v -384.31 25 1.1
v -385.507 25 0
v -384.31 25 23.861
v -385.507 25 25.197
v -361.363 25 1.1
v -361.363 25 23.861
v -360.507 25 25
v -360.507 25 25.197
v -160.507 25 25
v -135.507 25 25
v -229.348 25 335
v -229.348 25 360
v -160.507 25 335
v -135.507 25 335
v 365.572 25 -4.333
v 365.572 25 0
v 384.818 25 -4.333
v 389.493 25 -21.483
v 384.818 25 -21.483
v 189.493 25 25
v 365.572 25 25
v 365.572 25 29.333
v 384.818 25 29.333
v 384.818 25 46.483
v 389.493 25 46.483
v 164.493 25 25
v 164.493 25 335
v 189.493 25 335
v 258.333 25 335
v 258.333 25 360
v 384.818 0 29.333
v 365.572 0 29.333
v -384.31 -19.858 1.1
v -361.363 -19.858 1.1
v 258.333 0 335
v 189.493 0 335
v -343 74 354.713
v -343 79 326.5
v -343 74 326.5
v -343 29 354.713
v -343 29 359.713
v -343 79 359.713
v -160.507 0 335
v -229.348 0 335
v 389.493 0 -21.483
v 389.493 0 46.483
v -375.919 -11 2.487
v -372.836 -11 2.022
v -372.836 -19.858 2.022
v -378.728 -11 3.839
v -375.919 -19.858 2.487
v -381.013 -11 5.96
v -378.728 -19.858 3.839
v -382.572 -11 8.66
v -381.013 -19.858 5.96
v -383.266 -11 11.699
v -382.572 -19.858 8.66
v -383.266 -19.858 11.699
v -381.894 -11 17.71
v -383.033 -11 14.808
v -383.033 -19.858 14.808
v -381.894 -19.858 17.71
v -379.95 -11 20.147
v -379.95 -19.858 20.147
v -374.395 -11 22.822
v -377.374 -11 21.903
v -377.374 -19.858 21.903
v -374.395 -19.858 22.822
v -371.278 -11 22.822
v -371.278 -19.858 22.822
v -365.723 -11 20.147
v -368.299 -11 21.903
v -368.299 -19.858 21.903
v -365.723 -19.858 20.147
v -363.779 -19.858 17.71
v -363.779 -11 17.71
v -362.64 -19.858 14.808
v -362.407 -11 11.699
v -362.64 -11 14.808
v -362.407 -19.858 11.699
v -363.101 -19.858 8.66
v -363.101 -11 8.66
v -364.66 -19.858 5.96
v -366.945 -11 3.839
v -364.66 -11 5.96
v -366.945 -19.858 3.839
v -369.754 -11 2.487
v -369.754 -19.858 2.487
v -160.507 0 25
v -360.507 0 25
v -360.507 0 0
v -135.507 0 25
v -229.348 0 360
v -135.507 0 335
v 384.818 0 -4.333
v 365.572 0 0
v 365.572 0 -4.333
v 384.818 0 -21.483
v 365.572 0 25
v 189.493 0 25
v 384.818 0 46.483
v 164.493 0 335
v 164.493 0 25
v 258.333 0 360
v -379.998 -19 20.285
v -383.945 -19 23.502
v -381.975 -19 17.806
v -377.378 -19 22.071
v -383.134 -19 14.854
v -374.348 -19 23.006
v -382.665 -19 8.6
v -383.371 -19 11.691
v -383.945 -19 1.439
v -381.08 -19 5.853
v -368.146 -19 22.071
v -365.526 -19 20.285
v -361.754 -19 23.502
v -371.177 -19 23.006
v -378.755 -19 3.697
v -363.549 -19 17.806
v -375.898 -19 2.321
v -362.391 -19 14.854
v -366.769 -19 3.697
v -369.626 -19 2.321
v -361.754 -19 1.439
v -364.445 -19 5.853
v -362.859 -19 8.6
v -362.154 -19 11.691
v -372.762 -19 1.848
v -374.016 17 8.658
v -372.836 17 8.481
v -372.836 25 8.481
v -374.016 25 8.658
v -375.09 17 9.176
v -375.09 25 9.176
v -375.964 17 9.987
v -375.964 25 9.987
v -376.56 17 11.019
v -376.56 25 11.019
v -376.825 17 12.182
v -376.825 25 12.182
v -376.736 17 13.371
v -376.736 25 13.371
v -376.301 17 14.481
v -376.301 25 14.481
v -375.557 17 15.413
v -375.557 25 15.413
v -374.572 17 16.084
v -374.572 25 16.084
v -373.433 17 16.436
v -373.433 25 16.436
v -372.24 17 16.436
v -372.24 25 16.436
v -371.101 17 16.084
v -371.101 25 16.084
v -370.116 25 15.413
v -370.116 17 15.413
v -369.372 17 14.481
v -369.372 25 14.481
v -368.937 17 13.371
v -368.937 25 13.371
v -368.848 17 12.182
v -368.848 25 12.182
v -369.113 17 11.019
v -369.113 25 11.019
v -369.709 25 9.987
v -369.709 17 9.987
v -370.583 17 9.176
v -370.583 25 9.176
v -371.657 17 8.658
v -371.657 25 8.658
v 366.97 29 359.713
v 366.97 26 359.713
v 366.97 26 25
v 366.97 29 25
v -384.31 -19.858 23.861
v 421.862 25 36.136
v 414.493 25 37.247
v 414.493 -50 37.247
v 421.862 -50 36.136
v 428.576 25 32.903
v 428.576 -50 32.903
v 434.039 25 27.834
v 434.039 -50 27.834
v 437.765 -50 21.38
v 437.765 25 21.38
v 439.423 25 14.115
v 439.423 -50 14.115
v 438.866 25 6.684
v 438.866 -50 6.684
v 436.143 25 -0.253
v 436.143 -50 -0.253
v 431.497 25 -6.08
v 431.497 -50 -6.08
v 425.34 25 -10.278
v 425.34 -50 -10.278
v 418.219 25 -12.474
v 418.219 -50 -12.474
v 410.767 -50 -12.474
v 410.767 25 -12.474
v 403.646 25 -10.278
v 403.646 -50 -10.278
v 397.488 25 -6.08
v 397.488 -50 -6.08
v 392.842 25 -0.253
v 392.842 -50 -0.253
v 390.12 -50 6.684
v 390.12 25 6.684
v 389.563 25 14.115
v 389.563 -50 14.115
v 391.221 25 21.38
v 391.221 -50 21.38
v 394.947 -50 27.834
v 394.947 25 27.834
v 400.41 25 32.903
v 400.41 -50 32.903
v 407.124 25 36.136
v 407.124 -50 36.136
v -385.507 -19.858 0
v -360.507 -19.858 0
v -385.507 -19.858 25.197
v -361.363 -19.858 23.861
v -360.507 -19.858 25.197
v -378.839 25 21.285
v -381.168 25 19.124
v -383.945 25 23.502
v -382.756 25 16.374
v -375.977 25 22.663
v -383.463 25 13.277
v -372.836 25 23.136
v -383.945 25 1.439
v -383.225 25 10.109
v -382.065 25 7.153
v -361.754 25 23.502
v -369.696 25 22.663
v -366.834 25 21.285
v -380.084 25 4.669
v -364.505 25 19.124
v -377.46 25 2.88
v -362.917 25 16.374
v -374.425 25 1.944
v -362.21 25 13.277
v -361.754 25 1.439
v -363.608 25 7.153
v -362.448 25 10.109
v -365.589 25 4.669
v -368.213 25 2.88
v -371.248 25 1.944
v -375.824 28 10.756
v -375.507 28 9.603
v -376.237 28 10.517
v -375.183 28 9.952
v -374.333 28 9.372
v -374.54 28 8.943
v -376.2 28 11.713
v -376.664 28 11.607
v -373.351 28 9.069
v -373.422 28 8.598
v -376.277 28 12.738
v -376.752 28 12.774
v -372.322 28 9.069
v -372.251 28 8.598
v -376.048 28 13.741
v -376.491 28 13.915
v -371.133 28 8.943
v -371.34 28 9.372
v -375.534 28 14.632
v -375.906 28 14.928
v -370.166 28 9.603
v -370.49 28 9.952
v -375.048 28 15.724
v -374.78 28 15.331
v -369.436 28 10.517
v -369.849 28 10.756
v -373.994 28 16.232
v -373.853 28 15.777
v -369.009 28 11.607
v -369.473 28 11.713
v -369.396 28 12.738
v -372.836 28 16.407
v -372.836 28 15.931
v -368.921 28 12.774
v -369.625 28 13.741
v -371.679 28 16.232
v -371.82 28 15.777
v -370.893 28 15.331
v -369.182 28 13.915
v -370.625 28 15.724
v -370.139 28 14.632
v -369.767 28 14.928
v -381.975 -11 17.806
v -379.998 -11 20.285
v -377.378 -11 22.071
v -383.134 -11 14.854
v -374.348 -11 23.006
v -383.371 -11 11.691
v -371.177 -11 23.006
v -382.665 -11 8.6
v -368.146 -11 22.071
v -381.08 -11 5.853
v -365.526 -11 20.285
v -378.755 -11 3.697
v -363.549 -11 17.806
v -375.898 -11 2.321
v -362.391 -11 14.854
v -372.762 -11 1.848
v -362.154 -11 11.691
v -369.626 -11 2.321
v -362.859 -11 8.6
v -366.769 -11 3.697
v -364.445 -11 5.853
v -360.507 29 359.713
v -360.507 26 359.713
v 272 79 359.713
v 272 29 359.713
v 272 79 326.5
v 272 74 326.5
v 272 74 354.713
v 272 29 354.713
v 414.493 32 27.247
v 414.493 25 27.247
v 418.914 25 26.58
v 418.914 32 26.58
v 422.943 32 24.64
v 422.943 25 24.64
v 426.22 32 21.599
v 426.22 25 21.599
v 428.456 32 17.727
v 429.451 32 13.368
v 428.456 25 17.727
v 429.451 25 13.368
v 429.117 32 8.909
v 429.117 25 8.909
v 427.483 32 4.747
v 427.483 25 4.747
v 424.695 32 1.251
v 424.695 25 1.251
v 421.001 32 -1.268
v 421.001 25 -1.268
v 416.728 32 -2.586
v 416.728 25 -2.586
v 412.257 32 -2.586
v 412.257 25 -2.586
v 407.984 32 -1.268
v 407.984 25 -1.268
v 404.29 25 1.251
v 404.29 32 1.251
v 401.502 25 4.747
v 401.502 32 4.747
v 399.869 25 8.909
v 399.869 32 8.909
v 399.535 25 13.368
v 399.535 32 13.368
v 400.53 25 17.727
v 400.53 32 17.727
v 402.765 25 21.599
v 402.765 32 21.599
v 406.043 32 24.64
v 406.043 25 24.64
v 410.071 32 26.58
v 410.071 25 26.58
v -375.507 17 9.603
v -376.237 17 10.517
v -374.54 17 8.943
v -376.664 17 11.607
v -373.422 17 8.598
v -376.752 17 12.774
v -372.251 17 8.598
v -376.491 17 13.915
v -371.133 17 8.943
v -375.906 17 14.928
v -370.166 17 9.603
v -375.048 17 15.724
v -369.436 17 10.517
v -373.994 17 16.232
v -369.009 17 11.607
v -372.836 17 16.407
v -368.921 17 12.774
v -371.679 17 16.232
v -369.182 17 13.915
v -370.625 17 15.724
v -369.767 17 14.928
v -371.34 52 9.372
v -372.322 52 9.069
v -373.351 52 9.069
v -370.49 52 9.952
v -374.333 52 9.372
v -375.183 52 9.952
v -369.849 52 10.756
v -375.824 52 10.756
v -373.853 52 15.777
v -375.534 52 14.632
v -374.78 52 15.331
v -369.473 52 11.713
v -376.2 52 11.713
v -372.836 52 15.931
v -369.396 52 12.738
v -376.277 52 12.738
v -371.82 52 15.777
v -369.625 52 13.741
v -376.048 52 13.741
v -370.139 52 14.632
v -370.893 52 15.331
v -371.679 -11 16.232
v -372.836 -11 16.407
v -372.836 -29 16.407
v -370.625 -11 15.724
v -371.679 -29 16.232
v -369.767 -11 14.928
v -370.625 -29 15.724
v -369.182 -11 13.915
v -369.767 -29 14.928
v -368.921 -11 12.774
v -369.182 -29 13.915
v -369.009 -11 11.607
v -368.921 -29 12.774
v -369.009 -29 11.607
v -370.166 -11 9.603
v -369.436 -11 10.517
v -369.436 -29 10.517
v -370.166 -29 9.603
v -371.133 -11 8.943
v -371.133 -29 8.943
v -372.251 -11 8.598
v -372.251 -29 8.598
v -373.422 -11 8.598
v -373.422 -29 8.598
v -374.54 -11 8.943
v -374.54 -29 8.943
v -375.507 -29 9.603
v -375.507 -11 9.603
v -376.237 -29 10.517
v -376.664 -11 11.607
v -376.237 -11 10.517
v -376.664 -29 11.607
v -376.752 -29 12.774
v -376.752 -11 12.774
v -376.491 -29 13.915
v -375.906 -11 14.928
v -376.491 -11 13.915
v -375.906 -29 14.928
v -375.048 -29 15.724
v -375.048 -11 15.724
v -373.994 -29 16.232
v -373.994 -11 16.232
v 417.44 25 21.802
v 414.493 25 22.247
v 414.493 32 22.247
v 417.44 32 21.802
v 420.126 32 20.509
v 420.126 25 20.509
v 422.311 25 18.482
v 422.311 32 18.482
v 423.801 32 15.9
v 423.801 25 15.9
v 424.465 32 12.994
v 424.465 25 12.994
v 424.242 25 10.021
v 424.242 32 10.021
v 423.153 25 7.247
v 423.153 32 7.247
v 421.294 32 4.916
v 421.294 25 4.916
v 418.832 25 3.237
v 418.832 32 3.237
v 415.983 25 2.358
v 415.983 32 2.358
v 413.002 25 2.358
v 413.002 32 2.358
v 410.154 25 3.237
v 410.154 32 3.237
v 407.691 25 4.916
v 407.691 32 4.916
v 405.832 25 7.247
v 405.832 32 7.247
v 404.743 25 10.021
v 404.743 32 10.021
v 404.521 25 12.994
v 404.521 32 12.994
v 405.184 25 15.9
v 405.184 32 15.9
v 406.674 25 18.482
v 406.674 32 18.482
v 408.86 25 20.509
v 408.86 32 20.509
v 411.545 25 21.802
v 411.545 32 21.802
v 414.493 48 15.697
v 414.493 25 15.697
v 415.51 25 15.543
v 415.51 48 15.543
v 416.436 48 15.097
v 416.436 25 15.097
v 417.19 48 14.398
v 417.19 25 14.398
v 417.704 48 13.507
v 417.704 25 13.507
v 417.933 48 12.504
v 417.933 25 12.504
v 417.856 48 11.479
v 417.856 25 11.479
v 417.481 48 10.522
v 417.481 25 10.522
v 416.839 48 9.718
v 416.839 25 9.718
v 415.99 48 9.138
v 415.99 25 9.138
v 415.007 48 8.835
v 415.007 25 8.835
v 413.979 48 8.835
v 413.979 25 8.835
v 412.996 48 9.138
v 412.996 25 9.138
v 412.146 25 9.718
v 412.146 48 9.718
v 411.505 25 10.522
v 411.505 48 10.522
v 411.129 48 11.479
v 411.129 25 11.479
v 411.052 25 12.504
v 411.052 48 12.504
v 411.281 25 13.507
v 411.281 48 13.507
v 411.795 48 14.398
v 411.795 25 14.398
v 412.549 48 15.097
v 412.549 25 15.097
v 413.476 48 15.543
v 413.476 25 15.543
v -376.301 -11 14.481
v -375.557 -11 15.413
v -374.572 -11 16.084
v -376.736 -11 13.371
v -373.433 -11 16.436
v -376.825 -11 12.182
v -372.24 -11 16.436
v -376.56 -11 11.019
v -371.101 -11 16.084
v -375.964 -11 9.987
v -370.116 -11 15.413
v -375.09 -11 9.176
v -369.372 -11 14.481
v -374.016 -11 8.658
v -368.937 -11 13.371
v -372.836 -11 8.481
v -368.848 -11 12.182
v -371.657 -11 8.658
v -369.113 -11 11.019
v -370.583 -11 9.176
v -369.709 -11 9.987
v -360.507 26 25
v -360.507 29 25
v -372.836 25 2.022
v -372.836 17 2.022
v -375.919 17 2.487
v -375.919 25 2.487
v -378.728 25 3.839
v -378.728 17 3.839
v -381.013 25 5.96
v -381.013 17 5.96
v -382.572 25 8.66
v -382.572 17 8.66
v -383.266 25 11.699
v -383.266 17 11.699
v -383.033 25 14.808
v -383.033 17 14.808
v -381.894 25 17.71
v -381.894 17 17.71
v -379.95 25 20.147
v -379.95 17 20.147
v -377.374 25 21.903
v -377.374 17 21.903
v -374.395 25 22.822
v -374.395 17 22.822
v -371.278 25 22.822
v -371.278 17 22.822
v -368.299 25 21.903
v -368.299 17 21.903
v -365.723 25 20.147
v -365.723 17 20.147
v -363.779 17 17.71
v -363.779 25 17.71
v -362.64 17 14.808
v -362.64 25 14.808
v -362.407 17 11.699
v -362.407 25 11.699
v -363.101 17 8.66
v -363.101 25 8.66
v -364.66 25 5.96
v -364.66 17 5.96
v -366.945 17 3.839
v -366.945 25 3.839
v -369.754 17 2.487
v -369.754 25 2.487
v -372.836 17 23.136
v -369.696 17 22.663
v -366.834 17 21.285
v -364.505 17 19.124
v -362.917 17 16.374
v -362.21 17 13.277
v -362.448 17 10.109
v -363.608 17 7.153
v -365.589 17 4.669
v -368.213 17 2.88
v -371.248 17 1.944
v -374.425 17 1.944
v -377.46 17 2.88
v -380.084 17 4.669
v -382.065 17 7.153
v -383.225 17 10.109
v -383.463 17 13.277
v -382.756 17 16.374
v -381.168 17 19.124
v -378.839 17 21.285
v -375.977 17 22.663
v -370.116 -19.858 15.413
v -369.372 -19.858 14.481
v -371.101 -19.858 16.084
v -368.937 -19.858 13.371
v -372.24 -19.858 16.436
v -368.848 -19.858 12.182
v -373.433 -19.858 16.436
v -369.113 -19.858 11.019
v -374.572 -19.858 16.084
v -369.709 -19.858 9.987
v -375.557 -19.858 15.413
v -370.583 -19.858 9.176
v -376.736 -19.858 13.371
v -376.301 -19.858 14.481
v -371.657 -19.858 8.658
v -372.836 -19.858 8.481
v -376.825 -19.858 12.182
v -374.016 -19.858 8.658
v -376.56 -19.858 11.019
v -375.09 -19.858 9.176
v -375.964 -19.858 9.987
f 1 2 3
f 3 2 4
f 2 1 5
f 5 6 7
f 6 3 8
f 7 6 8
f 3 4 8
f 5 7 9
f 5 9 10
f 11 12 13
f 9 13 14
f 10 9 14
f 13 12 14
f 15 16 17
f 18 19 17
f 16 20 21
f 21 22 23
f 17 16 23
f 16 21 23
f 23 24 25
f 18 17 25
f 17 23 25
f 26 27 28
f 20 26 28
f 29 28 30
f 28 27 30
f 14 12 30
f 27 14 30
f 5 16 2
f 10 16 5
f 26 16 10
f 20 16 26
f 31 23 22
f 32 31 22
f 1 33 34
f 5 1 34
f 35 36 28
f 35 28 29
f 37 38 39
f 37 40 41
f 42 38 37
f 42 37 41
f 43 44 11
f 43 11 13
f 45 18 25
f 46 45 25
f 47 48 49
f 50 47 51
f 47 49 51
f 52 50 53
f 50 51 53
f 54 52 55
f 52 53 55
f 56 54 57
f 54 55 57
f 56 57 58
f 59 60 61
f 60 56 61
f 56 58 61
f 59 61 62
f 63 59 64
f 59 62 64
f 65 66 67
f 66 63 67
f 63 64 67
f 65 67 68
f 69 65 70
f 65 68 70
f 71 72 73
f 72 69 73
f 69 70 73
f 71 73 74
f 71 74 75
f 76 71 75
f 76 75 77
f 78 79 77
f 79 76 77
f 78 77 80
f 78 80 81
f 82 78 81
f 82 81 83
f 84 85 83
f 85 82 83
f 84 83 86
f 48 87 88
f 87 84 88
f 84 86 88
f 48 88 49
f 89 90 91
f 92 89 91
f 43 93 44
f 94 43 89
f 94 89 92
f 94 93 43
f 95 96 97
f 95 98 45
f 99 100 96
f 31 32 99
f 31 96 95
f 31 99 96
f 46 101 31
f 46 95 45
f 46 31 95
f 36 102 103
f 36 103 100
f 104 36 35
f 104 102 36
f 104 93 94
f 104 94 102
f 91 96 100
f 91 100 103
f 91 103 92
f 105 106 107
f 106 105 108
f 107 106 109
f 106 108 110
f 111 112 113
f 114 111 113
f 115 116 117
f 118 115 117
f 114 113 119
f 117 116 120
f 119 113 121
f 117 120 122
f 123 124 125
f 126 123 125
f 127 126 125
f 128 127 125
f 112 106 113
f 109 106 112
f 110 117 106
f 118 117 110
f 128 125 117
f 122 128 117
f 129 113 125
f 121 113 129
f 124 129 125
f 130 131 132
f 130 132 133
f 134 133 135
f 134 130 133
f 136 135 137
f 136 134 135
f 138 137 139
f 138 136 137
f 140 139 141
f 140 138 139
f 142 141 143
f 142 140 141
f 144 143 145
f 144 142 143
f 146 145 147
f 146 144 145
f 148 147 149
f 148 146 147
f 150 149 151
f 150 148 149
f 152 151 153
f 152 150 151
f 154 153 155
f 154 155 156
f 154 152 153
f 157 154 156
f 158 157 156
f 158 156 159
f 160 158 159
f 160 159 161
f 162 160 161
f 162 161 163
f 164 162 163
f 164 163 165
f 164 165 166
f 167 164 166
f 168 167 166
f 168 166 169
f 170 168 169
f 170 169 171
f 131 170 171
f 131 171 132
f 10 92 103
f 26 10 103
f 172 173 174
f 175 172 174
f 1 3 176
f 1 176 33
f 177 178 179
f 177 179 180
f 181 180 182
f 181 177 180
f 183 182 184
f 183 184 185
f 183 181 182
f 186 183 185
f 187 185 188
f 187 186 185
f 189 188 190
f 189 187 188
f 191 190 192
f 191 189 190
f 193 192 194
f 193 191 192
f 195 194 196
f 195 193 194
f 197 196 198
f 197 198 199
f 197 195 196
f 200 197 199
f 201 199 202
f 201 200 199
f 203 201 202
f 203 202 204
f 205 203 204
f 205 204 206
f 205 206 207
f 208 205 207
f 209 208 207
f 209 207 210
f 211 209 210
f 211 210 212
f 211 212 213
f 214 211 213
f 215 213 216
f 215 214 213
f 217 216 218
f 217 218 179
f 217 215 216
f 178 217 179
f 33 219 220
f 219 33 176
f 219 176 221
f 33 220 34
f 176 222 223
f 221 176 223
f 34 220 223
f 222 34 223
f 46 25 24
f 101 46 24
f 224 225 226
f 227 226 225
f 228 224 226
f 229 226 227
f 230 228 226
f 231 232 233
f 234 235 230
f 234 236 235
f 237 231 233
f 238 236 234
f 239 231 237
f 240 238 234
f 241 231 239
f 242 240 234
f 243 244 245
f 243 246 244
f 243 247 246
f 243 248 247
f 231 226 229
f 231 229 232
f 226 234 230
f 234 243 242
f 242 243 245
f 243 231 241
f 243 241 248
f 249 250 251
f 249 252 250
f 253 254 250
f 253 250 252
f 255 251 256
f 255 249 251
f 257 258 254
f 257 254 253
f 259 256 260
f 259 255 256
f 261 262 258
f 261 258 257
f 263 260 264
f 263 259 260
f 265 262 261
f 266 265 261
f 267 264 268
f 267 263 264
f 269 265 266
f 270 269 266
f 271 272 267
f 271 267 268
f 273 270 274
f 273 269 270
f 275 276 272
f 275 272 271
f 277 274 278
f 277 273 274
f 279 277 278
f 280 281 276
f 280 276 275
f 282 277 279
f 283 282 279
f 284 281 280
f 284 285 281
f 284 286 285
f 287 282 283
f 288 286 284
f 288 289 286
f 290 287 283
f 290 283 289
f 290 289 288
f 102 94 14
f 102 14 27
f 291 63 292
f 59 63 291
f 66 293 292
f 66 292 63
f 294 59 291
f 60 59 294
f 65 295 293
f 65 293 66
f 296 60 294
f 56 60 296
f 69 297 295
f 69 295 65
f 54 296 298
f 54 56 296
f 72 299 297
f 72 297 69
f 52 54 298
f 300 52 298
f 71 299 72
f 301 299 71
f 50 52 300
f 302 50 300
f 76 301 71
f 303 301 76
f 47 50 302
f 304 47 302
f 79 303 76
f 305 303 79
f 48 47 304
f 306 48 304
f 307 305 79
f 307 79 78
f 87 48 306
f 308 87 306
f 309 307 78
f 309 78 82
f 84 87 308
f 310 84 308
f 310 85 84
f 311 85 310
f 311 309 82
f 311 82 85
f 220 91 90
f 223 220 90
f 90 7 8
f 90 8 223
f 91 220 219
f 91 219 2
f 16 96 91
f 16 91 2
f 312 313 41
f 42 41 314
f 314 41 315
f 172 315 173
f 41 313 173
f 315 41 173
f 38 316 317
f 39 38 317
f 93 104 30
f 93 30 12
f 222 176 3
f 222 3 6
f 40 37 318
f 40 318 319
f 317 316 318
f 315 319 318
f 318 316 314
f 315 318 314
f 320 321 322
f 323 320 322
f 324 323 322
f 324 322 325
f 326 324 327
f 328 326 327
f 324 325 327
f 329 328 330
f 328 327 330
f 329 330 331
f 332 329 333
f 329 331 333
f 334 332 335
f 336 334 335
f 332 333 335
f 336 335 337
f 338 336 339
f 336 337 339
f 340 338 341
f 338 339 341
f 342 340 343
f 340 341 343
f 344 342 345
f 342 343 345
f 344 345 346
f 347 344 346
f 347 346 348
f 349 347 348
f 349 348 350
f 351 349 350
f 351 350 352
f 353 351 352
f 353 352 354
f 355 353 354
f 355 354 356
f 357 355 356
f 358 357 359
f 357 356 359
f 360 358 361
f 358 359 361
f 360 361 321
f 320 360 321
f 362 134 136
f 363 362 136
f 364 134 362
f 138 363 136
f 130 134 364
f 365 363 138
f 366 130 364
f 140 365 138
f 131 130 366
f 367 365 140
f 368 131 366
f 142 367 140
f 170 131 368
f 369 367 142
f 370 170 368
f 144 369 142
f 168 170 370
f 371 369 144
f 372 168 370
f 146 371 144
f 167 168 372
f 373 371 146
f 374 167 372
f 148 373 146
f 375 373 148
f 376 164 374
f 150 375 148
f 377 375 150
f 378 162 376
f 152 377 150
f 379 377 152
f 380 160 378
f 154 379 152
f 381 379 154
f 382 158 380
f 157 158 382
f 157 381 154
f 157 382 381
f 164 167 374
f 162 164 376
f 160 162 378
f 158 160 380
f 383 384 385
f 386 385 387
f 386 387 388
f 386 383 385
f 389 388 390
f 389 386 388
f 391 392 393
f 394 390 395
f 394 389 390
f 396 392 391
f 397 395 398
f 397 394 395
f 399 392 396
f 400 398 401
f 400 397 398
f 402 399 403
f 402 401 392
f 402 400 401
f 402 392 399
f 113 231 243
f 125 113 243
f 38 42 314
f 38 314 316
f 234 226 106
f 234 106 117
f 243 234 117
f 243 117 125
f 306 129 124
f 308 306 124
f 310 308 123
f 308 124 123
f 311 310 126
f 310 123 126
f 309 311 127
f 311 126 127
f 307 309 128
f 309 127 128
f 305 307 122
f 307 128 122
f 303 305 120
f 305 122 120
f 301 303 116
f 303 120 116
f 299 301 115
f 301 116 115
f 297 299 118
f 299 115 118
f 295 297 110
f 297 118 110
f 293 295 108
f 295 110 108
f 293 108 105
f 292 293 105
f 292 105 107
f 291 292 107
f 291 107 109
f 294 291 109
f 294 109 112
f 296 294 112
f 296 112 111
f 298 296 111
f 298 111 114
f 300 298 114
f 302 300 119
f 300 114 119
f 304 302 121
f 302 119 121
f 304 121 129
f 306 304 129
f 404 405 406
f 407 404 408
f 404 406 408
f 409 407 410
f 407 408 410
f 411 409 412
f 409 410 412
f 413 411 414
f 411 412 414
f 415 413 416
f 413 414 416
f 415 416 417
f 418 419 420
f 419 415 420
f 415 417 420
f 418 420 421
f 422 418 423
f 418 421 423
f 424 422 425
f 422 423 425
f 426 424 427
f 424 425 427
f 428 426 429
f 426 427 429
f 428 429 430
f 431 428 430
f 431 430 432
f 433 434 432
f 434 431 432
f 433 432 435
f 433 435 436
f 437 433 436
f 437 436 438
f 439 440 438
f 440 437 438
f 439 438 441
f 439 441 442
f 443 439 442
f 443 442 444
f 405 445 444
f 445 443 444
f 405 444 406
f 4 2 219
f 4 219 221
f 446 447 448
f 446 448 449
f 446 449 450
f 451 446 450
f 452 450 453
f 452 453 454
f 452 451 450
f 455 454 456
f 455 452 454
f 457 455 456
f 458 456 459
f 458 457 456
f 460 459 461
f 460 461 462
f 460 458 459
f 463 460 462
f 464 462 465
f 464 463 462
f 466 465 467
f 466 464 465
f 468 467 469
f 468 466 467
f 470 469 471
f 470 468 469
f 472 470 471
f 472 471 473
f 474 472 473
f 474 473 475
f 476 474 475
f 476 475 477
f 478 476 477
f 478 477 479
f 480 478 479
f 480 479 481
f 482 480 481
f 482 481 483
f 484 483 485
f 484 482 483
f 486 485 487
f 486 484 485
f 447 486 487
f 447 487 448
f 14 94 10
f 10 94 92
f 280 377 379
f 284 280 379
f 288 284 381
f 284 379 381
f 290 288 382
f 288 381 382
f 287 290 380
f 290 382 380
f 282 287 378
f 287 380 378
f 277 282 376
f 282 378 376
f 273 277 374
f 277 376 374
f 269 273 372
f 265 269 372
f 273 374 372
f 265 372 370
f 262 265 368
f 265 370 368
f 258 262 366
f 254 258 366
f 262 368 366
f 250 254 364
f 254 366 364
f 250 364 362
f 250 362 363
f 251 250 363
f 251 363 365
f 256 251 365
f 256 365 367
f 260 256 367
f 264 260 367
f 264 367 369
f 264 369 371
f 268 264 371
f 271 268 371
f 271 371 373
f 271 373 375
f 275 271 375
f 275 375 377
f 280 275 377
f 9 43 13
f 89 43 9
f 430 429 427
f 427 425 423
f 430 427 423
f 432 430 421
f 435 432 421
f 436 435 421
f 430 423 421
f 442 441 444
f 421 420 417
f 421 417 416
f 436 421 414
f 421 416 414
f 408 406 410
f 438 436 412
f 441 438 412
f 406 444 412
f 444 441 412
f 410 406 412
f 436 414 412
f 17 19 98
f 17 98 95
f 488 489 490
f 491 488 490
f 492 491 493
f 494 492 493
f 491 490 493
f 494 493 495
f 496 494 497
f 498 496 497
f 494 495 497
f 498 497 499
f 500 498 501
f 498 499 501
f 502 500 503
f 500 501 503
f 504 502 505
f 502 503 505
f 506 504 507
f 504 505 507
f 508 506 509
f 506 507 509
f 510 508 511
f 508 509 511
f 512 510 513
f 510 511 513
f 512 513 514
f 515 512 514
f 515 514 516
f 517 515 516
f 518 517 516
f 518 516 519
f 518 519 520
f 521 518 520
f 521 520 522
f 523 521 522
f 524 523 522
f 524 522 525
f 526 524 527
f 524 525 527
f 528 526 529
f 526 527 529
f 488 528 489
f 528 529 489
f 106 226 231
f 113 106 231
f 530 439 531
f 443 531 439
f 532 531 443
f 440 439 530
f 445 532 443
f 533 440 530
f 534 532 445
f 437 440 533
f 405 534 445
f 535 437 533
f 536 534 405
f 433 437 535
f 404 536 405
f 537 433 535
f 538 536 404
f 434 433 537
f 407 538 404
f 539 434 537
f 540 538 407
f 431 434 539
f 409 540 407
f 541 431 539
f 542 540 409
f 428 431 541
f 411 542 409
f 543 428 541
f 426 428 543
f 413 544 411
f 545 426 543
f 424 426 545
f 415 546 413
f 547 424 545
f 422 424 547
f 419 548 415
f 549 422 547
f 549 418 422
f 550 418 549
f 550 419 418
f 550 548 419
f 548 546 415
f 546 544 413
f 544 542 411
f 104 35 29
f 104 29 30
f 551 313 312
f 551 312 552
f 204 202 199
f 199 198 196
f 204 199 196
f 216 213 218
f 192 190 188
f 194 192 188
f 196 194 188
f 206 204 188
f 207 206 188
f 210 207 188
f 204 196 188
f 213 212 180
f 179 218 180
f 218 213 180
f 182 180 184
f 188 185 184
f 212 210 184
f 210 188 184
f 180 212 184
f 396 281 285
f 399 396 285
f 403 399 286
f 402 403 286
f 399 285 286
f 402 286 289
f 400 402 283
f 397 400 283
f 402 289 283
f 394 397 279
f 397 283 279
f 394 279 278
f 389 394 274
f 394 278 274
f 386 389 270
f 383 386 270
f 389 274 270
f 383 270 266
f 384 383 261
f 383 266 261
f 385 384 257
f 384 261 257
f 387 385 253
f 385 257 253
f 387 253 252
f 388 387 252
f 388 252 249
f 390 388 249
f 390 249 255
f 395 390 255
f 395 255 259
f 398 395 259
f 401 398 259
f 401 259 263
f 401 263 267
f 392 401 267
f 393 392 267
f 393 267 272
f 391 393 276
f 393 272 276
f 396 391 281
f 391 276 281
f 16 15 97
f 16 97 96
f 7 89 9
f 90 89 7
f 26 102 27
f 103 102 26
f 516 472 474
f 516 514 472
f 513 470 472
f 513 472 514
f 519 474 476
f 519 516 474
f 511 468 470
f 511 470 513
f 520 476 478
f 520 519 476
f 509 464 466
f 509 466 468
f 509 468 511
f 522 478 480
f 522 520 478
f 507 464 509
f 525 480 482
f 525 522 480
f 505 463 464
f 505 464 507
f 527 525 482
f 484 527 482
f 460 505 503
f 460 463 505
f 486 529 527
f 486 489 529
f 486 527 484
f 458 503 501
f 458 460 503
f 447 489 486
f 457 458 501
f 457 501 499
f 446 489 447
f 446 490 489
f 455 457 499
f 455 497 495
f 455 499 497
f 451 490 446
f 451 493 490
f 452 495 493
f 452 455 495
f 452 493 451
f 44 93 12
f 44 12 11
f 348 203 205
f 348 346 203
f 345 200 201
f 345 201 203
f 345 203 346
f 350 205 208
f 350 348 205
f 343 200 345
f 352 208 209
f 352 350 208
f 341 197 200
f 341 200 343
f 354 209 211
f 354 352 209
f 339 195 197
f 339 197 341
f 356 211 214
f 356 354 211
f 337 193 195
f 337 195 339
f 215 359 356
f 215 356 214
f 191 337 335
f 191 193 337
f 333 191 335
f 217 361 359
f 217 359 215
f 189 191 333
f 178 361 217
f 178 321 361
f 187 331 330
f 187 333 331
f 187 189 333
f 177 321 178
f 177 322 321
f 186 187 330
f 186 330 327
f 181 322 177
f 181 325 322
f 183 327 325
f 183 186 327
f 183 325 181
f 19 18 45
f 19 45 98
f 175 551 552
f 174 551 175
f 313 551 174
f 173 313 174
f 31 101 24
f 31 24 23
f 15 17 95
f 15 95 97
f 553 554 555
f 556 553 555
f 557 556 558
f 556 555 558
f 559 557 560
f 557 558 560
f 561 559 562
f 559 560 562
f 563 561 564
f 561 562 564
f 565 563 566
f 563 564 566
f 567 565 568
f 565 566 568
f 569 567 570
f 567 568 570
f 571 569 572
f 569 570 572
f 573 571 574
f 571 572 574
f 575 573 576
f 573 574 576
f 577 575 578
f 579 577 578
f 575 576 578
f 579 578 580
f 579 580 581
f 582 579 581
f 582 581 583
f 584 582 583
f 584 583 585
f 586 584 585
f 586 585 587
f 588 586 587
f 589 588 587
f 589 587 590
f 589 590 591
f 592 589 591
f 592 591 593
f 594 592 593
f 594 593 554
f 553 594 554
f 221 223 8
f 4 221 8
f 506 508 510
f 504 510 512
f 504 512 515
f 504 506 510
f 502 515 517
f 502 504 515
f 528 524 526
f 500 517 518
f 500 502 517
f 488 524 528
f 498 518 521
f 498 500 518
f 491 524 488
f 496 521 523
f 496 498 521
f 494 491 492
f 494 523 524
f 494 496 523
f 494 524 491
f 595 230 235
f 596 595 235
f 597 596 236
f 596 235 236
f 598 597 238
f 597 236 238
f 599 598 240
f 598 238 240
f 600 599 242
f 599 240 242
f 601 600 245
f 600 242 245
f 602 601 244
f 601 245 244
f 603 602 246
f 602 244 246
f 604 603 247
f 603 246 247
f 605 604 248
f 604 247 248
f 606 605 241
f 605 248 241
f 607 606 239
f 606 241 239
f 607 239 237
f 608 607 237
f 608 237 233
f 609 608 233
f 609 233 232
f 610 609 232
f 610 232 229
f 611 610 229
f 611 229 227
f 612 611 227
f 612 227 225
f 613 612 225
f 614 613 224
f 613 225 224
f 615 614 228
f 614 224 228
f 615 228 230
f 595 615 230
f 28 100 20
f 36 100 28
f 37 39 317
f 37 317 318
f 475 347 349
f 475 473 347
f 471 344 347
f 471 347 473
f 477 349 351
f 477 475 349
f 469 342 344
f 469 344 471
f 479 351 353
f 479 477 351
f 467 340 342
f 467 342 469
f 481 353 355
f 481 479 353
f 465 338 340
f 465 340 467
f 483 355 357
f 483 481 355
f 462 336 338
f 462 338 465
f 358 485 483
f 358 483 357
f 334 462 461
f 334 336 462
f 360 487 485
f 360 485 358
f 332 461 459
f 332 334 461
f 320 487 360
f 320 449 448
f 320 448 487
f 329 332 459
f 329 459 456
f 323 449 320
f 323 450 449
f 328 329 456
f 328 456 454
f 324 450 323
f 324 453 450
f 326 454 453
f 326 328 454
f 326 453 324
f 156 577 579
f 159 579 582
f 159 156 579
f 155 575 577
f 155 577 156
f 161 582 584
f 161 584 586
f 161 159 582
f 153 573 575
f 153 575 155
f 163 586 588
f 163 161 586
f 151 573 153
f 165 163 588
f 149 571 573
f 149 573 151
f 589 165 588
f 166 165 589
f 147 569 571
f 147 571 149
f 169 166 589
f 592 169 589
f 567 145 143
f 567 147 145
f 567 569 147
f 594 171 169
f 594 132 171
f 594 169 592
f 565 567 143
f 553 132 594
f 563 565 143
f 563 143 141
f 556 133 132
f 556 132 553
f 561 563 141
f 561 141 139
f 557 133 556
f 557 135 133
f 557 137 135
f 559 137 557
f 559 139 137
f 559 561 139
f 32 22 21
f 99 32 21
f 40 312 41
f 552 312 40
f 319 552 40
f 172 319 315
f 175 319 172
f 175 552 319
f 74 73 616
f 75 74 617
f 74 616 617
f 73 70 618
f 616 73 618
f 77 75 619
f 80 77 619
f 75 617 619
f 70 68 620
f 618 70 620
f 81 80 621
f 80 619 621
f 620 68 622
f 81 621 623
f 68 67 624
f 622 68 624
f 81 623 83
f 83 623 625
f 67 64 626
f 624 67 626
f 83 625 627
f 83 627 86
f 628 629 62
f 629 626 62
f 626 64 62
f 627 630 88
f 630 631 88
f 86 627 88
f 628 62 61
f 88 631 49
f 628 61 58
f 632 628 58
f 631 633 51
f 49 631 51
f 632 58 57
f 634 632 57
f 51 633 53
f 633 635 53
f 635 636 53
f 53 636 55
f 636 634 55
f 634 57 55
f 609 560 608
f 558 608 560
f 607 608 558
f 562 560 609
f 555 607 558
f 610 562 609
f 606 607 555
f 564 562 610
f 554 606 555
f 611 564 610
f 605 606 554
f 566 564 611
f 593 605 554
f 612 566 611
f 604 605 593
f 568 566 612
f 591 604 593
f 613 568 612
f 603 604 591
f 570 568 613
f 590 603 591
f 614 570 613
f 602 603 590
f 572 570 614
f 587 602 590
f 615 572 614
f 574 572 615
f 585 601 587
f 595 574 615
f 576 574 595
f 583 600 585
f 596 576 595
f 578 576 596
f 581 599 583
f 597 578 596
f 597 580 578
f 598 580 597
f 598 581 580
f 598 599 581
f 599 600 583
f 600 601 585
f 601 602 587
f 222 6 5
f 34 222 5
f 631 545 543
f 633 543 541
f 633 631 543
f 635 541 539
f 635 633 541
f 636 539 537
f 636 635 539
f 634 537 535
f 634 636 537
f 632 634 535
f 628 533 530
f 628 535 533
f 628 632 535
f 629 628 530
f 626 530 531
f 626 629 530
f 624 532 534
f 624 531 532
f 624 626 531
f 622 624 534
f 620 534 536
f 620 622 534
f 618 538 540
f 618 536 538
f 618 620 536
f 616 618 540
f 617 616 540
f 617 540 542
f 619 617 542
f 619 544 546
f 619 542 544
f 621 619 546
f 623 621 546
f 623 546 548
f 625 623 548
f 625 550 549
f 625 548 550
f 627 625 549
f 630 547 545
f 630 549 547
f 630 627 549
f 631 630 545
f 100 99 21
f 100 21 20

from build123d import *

# Parameters (mm, degrees)
SKETCH1_W                = 300
SKETCH1_H                = 310
BOSS_EXTRUDE1_DEPTH      = 25
SKETCH4_W                = 25.197370863
SKETCH4_H                = 44.858176632
BOSS_EXTRUDE2_DEPTH      = 25
SKETCH5_W                = 22.946033492
SKETCH5_H                = 22.760235649
CUT_EXTRUDE1_DEPTH       = 533.275174262
SKETCH7_W                = 22.191646781
SKETCH7_H                = 22.062999553
BOSS_EXTRUDE4_DEPTH      = 44
SKETCH8_R                = 10.655804952
CUT_EXTRUDE2_DEPTH       = 8
SKETCH9_R                = 10.638433537
CUT_EXTRUDE3_DEPTH       = 8
BOSS_EXTRUDE5_DEPTH      = 8
BOSS_EXTRUDE5_DEPTH_BACK = 36.858177
SKETCH12_R               = 10.458580424
SKETCH12_R_2             = 4
SKETCH14_W               = 727.477263183
SKETCH14_H               = 334.713139096
BOSS_EXTRUDE6_DEPTH      = 3
BOSS_EXTRUDE7_DEPTH      = 272
BOSS_EXTRUDE7_DEPTH_BACK = 343
BOSS_EXTRUDE8_DEPTH      = 3
BOSS_EXTRUDE8_DEPTH_BACK = 54
SKETCH16_R               = 3.92609933
SKETCH17_R               = 3.45
BOSS_EXTRUDE9_DEPTH      = 24
SKETCH18_R               = 25
BOSS_EXTRUDE10_DEPTH     = 75
BOSS_EXTRUDE12_DEPTH     = 25
SKETCH21_R               = 15
SKETCH21_R_2             = 10
BOSS_EXTRUDE13_DEPTH     = 7
SKETCH22_R               = 3.45
BOSS_EXTRUDE14_DEPTH     = 23


with BuildPart() as part:
    # Sketch1 → Boss-Extrude1 (new body)
    with BuildSketch(Plane(origin=(0, 0, 0), x_dir=(1, 0, 0), z_dir=(0, 1, 0))):
        Polygon((-360.507246377, 0), (389.492753623, 0), (389.492753623, -25), (189.492753623, -25), (189.492753623, -335), (258.333333333, -335), (258.333333333, -360), (-229.347826087, -360), (-229.347826087, -335), (-160.507246377, -335), (-160.507246377, -25), (-360.507246377, -25), align=None)
        with Locations((14.492753623, -180)):
            Rectangle(SKETCH1_W, SKETCH1_H, mode=Mode.SUBTRACT)
    extrude(amount=BOSS_EXTRUDE1_DEPTH)

    # Sketch4 → Boss-Extrude2 (add)
    with BuildSketch(Plane.ZY.offset(360.507246377)):
        with Locations((12.598685432, 2.570911684)):
            Rectangle(SKETCH4_W, SKETCH4_H)
    extrude(amount=BOSS_EXTRUDE2_DEPTH)

    # Sketch5 → Cut-Extrude1 (cut, through all)
    with BuildSketch(Plane(origin=(0, 25, 0), x_dir=(1, 0, 0), z_dir=(0, 1, 0))):
        with Locations((-372.836496425, -12.480540279)):
            Rectangle(SKETCH5_W, SKETCH5_H)
    extrude(amount=-CUT_EXTRUDE1_DEPTH, mode=Mode.SUBTRACT)

    # Sketch19 → Boss-Extrude12 (add)
    with BuildSketch(Plane(origin=(0, 25, 0), x_dir=(1, 0, 0), z_dir=(0, 1, 0))):
        Polygon((389.492753623, 0), (389.492753623, 21.483362749), (384.817785784, 21.483362749), (384.817785784, 4.33344442), (365.571766327, 4.33344442), (365.571766327, 0), align=None)
    boss_extrude12 = extrude(amount=-BOSS_EXTRUDE12_DEPTH)

    # Mirror1: Boss-Extrude12 across plane
    add(boss_extrude12.mirror(Plane.XY.offset(12.5)))


with BuildPart() as body_2:
    # Sketch7 → Boss-Extrude4 (new body)
    with BuildSketch(Plane(origin=(0, 25, 0), x_dir=(1, 0, 0), z_dir=(0, 1, 0))):
        with Locations((-372.849449875, -12.470537148)):
            Rectangle(SKETCH7_W, SKETCH7_H)
    extrude(amount=-BOSS_EXTRUDE4_DEPTH)

    # Sketch8 → Cut-Extrude2 (cut)
    with BuildSketch(Plane(origin=(0, 25, 0), x_dir=(1, 0, 0), z_dir=(0, 1, 0))):
        with Locations(Location((-372.836496425, -12.480540278, 0), (0, 0, 270))):
            Circle(SKETCH8_R)
    extrude(amount=-CUT_EXTRUDE2_DEPTH, mode=Mode.SUBTRACT)

    # Sketch9 → Cut-Extrude3 (cut)
    with BuildSketch(Plane(origin=(0, -19, 0), x_dir=(-1, 0, 0), z_dir=(0, -1, 0))):
        with Locations(Location((372.762225598, -12.486408958, 0), (0, 0, 90))):
            Circle(SKETCH9_R)
    extrude(amount=-CUT_EXTRUDE3_DEPTH, mode=Mode.SUBTRACT)

    # Sketch12 → Boss-Extrude5 (add, two sides: drawn at the far end of the back side and taken through both)
    with BuildSketch(Plane(origin=(0, 17, 0), x_dir=(1, 0, 0), z_dir=(0, 1, 0)).offset(-BOSS_EXTRUDE5_DEPTH_BACK)):
        with Locations(Location((-372.836496425, -12.480540278, 0), (0, 0, 90))):
            Circle(SKETCH12_R)
        with Locations(Location((-372.836496425, -12.480540278, 0), (0, 0, 90))):
            Circle(SKETCH12_R_2, mode=Mode.SUBTRACT)
    extrude(amount=BOSS_EXTRUDE5_DEPTH + BOSS_EXTRUDE5_DEPTH_BACK)

    # Sketch16 → Boss-Extrude8 (add, two sides: drawn at the far end of the back side and taken through both)
    with BuildSketch(Plane(origin=(0, 25, 0), x_dir=(1, 0, 0), z_dir=(0, 1, 0)).offset(-BOSS_EXTRUDE8_DEPTH_BACK)):
        with Locations(Location((-372.836496425, -12.480540278, 0), (0, 0, 270))):
            Circle(SKETCH16_R)
    extrude(amount=BOSS_EXTRUDE8_DEPTH + BOSS_EXTRUDE8_DEPTH_BACK)

    # Sketch17 → Boss-Extrude9 (add)
    with BuildSketch(Plane(origin=(0, 28, 0), x_dir=(1, 0, 0), z_dir=(0, 1, 0))):
        with Locations(Location((-372.836496425, -12.480540278, 0), (0, 0, 270))):
            Circle(SKETCH17_R)
    extrude(amount=BOSS_EXTRUDE9_DEPTH)


with BuildPart() as body_3:
    # Sketch14 → Boss-Extrude6 (new body)
    with BuildSketch(Plane(origin=(0, 26, 0), x_dir=(1, 0, 0), z_dir=(0, 1, 0))):
        with Locations((3.231385215, -192.356569548)):
            Rectangle(SKETCH14_W, SKETCH14_H)
    extrude(amount=BOSS_EXTRUDE6_DEPTH)

    # Sketch15 → Boss-Extrude7 (add, two sides: drawn at the far end of the back side and taken through both)
    with BuildSketch(Plane(origin=(0, 0, 0), x_dir=(0, 0, -1), z_dir=(1, 0, 0)).offset(-BOSS_EXTRUDE7_DEPTH_BACK)):
        Polygon((-359.713139096, 29), (-359.713139096, 79), (-326.500243697, 79), (-326.500243697, 74), (-354.713139096, 74), (-354.713139096, 29), align=None)
    extrude(amount=BOSS_EXTRUDE7_DEPTH + BOSS_EXTRUDE7_DEPTH_BACK)


with BuildPart() as body_4:
    # Sketch18 → Boss-Extrude10 (new body)
    with BuildSketch(Plane(origin=(0, 25, 0), x_dir=(1, 0, 0), z_dir=(0, 1, 0))):
        with Locations(Location((414.492753623, -12.246603976, 0), (0, 0, 270))):
            Circle(SKETCH18_R)
    extrude(amount=-BOSS_EXTRUDE10_DEPTH)

    # Sketch21 → Boss-Extrude13 (add)
    with BuildSketch(Plane(origin=(0, 25, 0), x_dir=(1, 0, 0), z_dir=(0, 1, 0))):
        with Locations(Location((414.492753623, -12.246603976, 0), (0, 0, 270))):
            Circle(SKETCH21_R)
        with Locations(Location((414.492753623, -12.246603976, 0), (0, 0, 270))):
            Circle(SKETCH21_R_2, mode=Mode.SUBTRACT)
    extrude(amount=BOSS_EXTRUDE13_DEPTH)

    # Sketch22 → Boss-Extrude14 (add)
    with BuildSketch(Plane(origin=(0, 25, 0), x_dir=(1, 0, 0), z_dir=(0, 1, 0))):
        with Locations(Location((414.492753623, -12.246603976, 0), (0, 0, 270))):
            Circle(SKETCH22_R)
    extrude(amount=BOSS_EXTRUDE14_DEPTH)


solid = Compound([part.part, body_2.part, body_3.part, body_4.part])
